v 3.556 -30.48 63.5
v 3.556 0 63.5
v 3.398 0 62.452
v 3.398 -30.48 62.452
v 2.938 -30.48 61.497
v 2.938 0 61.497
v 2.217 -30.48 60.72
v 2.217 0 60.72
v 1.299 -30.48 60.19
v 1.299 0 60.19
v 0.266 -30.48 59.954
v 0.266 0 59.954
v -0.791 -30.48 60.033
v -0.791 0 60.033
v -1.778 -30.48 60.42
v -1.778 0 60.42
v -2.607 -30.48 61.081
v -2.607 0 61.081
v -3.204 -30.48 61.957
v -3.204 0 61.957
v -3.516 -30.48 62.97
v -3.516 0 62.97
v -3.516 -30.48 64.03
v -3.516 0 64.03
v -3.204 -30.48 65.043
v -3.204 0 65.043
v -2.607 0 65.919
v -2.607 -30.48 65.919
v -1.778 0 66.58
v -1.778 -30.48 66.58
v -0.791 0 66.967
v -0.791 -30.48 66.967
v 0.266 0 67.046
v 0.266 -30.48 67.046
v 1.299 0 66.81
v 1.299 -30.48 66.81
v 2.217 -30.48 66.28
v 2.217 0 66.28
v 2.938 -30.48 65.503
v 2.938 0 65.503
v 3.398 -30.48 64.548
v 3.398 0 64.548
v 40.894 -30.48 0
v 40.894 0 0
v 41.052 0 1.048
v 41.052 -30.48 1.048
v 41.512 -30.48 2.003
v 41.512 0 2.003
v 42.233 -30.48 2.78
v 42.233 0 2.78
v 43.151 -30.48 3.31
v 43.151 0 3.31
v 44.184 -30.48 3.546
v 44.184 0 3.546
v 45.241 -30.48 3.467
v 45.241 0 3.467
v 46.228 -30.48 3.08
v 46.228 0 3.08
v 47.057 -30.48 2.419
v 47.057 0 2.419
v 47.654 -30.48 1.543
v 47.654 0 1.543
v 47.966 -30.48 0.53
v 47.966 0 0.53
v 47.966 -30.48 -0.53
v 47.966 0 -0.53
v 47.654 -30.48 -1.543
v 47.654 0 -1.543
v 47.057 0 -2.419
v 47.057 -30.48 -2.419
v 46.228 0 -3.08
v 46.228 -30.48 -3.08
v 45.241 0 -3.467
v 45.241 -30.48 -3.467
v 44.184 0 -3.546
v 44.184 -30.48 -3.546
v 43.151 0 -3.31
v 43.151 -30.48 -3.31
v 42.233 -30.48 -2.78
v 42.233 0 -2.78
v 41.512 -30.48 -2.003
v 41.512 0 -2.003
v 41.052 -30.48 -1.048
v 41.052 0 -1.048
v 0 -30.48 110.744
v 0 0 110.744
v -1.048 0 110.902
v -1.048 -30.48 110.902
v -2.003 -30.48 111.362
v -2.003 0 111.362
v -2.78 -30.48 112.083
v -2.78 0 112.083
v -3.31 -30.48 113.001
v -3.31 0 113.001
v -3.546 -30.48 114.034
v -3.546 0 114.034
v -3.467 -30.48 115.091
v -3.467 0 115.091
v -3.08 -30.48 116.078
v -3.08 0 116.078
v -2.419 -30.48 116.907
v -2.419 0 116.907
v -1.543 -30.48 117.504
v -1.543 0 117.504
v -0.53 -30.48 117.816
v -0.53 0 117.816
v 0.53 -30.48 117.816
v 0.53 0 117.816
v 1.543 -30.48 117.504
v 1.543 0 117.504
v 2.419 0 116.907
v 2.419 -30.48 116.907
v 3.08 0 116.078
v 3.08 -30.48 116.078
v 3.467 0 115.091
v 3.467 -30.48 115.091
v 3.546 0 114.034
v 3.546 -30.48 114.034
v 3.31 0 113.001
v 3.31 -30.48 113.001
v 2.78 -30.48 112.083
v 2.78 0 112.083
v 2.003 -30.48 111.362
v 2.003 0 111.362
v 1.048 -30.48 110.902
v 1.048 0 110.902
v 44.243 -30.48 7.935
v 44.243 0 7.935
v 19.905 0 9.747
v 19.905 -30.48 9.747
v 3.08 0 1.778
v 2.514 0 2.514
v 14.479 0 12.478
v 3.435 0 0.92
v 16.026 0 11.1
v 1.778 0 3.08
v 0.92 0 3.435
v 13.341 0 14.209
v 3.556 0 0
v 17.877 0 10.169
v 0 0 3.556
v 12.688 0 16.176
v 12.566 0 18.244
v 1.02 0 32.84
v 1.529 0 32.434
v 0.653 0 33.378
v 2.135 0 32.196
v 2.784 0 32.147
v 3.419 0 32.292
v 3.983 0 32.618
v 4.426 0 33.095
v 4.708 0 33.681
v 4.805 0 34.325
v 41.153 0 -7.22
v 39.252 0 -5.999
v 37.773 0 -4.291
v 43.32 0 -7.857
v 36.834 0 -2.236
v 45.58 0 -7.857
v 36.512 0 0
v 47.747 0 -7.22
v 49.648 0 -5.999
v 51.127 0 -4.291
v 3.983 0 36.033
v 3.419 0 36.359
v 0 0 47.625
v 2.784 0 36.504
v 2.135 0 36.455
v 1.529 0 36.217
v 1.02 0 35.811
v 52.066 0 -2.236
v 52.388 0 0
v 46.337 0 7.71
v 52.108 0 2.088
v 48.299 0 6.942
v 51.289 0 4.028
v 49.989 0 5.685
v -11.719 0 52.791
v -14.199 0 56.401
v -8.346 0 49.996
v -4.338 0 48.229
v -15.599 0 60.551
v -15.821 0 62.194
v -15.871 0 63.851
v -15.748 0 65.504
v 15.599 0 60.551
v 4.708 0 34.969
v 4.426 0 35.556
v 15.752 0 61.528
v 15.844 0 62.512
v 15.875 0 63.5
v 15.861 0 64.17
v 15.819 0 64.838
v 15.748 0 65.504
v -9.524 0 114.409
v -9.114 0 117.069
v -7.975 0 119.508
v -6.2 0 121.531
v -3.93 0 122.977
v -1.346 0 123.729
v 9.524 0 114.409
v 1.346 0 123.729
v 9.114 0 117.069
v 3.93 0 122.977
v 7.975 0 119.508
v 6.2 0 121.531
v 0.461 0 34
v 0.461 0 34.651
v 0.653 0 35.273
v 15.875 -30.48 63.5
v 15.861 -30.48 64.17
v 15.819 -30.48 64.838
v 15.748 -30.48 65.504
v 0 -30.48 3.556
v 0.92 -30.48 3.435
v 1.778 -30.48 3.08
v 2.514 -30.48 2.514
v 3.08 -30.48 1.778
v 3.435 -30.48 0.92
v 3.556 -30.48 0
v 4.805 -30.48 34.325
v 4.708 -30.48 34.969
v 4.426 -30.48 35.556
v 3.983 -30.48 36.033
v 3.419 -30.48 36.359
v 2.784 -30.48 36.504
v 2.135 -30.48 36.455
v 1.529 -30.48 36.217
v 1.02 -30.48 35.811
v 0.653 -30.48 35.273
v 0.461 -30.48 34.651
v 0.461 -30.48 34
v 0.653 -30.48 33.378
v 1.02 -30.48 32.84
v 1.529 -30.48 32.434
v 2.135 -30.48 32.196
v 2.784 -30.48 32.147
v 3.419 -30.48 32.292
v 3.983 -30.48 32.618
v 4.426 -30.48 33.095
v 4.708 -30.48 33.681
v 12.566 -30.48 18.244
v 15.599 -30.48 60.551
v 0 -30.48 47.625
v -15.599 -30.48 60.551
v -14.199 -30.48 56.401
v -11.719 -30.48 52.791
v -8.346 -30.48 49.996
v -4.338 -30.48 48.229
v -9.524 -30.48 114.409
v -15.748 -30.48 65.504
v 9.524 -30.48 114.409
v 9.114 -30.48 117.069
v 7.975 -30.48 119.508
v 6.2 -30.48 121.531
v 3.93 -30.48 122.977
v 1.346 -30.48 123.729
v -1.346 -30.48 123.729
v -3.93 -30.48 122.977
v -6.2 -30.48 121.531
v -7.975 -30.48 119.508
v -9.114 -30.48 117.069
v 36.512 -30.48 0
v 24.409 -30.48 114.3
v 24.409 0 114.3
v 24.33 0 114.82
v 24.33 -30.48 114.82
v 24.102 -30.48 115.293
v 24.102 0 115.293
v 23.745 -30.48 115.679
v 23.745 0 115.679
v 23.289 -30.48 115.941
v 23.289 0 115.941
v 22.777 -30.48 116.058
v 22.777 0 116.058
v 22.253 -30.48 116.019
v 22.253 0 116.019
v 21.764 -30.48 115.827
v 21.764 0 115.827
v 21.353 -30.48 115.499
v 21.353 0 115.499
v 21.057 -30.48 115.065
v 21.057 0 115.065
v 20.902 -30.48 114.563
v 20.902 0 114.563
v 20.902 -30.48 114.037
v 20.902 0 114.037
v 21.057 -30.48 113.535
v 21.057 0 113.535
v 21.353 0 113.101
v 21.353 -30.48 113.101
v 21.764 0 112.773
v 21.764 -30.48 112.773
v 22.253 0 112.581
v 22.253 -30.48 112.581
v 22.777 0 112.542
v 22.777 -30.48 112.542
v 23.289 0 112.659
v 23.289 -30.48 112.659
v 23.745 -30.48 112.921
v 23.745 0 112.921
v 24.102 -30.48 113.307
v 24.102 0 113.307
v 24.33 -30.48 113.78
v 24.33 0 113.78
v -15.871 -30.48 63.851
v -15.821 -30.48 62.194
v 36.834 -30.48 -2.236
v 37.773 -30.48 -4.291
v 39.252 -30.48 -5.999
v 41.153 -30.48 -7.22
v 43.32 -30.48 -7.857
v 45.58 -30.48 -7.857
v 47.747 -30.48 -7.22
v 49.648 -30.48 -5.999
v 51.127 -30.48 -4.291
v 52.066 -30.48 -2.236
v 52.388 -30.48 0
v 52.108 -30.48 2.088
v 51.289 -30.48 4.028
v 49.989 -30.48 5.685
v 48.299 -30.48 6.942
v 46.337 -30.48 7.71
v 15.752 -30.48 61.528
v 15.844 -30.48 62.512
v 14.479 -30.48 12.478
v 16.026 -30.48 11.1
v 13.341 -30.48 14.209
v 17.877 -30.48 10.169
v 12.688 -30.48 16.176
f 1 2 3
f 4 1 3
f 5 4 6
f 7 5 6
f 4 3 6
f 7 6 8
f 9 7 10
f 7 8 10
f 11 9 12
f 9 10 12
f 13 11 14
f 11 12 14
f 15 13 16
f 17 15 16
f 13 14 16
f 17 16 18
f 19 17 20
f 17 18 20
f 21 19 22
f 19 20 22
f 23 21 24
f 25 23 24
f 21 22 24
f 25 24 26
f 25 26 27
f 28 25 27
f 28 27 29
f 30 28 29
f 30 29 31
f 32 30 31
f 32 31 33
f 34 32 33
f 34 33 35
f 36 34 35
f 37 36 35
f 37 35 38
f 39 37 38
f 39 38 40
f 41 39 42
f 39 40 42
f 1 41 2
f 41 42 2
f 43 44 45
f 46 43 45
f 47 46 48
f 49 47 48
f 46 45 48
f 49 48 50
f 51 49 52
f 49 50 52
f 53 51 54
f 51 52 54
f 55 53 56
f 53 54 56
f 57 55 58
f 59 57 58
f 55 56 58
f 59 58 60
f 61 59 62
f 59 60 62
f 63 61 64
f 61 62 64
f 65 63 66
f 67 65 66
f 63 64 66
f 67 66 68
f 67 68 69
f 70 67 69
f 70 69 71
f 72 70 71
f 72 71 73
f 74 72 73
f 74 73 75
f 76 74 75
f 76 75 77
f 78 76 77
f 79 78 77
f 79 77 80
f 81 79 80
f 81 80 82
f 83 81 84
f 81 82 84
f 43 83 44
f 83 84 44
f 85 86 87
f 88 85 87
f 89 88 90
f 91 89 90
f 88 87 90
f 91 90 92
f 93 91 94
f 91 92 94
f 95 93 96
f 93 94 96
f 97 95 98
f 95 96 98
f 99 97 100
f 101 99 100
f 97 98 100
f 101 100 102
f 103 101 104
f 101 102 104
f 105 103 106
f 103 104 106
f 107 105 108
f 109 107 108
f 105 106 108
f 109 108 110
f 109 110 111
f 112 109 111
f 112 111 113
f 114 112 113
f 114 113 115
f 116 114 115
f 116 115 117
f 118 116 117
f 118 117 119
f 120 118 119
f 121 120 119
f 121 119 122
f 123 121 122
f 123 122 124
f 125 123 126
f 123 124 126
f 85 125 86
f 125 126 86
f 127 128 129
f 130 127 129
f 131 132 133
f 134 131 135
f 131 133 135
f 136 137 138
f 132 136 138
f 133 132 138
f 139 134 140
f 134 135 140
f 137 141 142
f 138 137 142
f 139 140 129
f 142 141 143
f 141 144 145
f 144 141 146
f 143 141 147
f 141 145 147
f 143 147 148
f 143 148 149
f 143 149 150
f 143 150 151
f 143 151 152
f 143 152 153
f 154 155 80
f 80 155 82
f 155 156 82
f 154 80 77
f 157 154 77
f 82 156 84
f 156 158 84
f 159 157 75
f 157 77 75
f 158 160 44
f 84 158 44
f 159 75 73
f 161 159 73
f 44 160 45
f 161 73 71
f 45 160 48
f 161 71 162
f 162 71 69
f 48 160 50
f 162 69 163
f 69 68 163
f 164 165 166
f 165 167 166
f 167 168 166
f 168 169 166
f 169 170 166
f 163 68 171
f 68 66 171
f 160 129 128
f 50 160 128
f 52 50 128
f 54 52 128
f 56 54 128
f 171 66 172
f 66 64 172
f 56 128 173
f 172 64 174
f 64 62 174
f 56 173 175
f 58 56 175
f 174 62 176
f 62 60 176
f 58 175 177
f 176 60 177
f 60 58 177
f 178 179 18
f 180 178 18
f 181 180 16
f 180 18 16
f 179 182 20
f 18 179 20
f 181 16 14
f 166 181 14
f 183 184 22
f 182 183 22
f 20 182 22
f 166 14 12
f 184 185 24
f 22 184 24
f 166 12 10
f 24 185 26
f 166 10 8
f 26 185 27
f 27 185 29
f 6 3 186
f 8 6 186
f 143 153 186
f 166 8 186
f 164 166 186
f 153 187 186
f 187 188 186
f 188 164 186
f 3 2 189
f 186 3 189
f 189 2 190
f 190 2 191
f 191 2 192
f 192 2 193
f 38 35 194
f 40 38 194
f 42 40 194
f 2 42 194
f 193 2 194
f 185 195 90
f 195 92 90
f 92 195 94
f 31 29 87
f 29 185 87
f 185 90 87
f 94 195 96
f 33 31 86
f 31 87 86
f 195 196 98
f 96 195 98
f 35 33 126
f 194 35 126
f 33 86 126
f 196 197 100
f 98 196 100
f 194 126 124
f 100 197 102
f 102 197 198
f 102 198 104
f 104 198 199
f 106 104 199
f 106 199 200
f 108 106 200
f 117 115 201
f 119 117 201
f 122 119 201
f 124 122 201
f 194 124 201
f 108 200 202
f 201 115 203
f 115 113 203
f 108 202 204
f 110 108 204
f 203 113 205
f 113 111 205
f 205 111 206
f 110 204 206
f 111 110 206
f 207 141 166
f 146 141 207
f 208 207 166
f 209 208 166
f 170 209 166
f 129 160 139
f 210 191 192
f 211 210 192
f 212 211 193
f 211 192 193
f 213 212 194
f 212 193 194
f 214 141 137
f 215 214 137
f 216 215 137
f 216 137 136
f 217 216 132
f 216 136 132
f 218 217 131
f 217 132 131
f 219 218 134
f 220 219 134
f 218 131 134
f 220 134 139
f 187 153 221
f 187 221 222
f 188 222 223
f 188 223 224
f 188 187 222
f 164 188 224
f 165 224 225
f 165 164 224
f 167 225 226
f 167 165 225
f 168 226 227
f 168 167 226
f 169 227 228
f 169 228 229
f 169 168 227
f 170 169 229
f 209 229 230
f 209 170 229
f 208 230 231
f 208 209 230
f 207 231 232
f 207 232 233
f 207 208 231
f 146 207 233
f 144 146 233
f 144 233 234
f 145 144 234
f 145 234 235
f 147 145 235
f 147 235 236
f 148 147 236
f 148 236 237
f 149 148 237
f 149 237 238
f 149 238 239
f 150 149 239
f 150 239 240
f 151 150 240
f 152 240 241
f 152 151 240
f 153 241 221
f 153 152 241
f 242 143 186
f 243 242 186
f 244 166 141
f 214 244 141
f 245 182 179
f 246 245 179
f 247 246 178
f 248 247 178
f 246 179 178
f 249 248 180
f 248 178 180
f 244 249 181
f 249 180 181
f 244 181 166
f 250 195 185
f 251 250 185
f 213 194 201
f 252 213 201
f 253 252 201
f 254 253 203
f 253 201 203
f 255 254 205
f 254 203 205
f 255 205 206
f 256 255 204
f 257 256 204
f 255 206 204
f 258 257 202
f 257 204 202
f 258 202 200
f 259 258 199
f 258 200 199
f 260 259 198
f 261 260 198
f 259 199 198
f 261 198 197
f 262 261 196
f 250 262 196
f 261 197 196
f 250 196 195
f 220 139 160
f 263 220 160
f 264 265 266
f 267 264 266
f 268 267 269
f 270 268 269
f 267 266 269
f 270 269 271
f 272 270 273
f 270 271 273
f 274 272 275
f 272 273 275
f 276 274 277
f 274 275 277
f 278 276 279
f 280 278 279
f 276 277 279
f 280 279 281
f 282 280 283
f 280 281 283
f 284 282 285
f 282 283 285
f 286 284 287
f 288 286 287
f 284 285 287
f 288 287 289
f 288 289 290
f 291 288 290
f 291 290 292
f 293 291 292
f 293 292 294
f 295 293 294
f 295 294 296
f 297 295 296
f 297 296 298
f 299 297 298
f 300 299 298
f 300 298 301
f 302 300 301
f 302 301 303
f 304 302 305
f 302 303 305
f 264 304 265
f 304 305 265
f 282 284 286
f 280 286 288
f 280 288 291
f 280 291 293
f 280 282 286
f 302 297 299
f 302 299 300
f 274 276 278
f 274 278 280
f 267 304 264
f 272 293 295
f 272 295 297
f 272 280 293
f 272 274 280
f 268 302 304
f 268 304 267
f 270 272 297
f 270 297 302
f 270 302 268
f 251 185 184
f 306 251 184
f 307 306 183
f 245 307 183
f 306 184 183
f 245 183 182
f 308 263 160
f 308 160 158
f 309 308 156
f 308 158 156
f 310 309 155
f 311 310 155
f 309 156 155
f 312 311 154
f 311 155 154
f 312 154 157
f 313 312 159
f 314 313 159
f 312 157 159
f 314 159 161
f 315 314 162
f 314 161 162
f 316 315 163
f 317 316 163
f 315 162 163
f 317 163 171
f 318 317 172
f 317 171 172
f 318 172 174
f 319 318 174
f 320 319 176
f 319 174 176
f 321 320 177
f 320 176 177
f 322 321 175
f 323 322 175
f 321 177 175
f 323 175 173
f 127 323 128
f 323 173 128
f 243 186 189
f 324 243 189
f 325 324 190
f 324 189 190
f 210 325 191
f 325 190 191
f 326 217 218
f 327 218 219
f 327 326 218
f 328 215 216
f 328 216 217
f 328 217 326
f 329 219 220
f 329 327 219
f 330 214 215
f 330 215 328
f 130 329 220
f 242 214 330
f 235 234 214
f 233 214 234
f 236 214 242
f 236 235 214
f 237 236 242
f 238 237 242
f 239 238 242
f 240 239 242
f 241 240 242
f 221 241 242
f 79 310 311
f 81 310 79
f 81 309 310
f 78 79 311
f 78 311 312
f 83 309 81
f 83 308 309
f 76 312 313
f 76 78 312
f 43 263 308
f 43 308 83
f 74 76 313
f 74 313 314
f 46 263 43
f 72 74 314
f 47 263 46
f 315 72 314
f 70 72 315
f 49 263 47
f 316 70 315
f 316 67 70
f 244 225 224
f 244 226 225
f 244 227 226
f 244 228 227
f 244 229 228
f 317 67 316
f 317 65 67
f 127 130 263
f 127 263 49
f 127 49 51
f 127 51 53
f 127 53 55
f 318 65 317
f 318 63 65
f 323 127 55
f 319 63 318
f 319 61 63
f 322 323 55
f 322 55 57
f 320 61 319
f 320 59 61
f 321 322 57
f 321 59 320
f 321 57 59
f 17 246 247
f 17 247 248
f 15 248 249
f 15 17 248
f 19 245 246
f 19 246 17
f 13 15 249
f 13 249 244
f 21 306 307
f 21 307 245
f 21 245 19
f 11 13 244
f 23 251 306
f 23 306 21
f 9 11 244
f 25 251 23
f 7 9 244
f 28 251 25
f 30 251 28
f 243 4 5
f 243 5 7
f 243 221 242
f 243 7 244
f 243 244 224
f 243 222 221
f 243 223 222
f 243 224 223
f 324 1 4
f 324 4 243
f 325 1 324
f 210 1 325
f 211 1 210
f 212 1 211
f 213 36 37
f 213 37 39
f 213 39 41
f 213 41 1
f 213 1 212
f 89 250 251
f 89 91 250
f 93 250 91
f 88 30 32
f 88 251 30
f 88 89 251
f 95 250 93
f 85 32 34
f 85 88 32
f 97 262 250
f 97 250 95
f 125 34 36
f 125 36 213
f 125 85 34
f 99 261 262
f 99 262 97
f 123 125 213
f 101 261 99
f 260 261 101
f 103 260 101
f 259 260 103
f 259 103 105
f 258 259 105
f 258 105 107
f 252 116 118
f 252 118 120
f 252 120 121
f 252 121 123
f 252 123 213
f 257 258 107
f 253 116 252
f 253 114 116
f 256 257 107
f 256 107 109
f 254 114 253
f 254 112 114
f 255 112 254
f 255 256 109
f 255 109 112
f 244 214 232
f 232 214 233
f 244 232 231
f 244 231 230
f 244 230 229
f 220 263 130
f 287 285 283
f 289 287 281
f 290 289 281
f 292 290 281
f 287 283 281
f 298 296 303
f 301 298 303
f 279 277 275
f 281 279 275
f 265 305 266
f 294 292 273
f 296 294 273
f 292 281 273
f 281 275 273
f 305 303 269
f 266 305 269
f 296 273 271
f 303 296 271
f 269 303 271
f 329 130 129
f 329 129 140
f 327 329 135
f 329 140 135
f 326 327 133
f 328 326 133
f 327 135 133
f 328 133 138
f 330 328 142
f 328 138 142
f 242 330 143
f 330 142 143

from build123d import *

# Parameters (mm, degrees)
F0_R     = 2.1842909743
F1_DEPTH = 30.48
F0_R_2   = 1.7632939696


with BuildPart() as f1:
    # F0 (on Front) → F1 (new body)
    with BuildSketch(Plane.XZ):
        with BuildLine():
            ThreePointArc((-9.5243800429, 114.4086728964), (-6.7735047921, 107.6033398002), (0, 104.775))
            ThreePointArc((0, 104.775), (6.7351920908, 107.5648079092), (9.525, 114.3))
            ThreePointArc((9.525, 114.3), (9.5248450095, 114.3543373324), (9.5243800429, 114.4086728964))
            ThreePointArc((9.5243800429, 114.4086728964), (0, 123.825), (-9.5243800429, 114.4086728964))
        make_face()
        with BuildLine():
            ThreePointArc((3.556, 114.3), (2.5144717139, 111.7855282861), (0, 110.744))
            ThreePointArc((0, 110.744), (-2.5144717139, 116.8144717139), (3.556, 114.3))
        make_face(mode=Mode.SUBTRACT)
        with BuildLine():
            ThreePointArc((9.525, 114.3), (6.7351920908, 107.5648079092), (0, 104.775))
            Line((0, 104.775), (0, 79.375))
            ThreePointArc((0, 79.375), (10.4928697542, 75.4128212159), (15.7479913604, 65.5040940878))
            Line((15.7479913604, 65.5040940878), (9.5243800429, 114.4086728964))
            ThreePointArc((9.5243800429, 114.4086728964), (9.5248450095, 114.3543373324), (9.525, 114.3))
        make_face()
        with BuildLine():
            Line((0, 79.375), (0, 104.775))
            ThreePointArc((0, 104.775), (-6.7735047921, 107.6033398002), (-9.5243800429, 114.4086728964))
            Line((-9.5243800429, 114.4086728964), (-15.7479913604, 65.5040940878))
            ThreePointArc((-15.7479913604, 65.5040940878), (-10.4928697542, 75.4128212159), (0, 79.375))
        make_face()
        with BuildLine():
            ThreePointArc((15.7479913604, 65.5040940878), (10.4928697542, 75.4128212159), (0, 79.375))
            Line((0, 79.375), (0, 67.056))
            ThreePointArc((0, 67.056), (2.5144717139, 66.0144717139), (3.556, 63.5))
            ThreePointArc((3.556, 63.5), (2.5144717139, 60.9855282861), (0, 59.944))
            Line((0, 59.944), (0, 47.625))
            ThreePointArc((0, 47.625), (10.1293130273, 51.2765535713), (15.5987546644, 60.5513599881))
            ThreePointArc((15.5987546644, 60.5513599881), (15.8057877896, 62.0192240712), (15.875, 63.5))
            ThreePointArc((15.875, 63.5), (15.8432160221, 64.5040573076), (15.7479913604, 65.5040940878))
        make_face()
        with BuildLine():
            Line((0, 67.056), (0, 79.375))
            ThreePointArc((0, 79.375), (-10.4928697542, 75.4128212159), (-15.7479913604, 65.5040940878))
            ThreePointArc((-15.7479913604, 65.5040940878), (-15.8677980625, 63.0218685866), (-15.5987546644, 60.5513599881))
            ThreePointArc((-15.5987546644, 60.5513599881), (-10.1293130273, 51.2765535713), (0, 47.625))
            Line((0, 47.625), (0, 59.944))
            ThreePointArc((0, 59.944), (-3.556, 63.5), (0, 67.056))
        make_face()
        with BuildLine():
            ThreePointArc((15.5987546644, 60.5513599881), (10.1293130273, 51.2765535713), (0, 47.625))
            Line((0, 47.625), (0, 11.2290981952))
            ThreePointArc((0, 11.2290981952), (7.9401714804, 7.9401714804), (11.2290981952, 0))
            Line((11.2290981952, 0), (36.5125, 0))
            ThreePointArc((36.5125, 0), (38.764717935, 5.539086034), (44.2432651255, 7.9348073034))
            Line((44.2432651255, 7.9348073034), (19.9053036746, 9.7469774609))
            ThreePointArc((19.9053036746, 9.7469774609), (14.4792388722, 12.4782393627), (12.5657807814, 18.2437097642))
            Line((12.5657807814, 18.2437097642), (15.5987546644, 60.5513599881))
        make_face()
        with Locations((2.6209076754, 34.3253262466)):
            Circle(F0_R, mode=Mode.SUBTRACT)
        with BuildLine():
            ThreePointArc((11.2290981952, 0), (7.9401714804, 7.9401714804), (0, 11.2290981952))
            Line((0, 11.2290981952), (0, 3.556))
            ThreePointArc((0, 3.556), (2.5144717139, 2.5144717139), (3.556, 0))
            Line((3.556, 0), (11.2290981952, 0))
        make_face()
        with BuildLine():
            ThreePointArc((44.2432651255, 7.9348073034), (38.764717935, 5.539086034), (36.5125, 0))
            ThreePointArc((36.5125, 0), (44.45, -7.9375), (52.3875, 0))
            ThreePointArc((52.3875, 0), (49.989086034, 5.685282065), (44.2432651255, 7.9348073034))
        make_face()
        with BuildLine():
            ThreePointArc((48.006, 0), (44.45, -3.556), (40.894, 0))
            ThreePointArc((40.894, 0), (44.45, 3.556), (48.006, 0))
        make_face(mode=Mode.SUBTRACT)
    extrude(amount=F1_DEPTH)


with BuildPart() as f1b:
    # F0 (on Front) → F1, piece 2 (new body)
    with BuildSketch(Plane.XZ):
        with Locations((22.6452313364, 114.3)):
            Circle(F0_R_2)
    extrude(amount=F1_DEPTH)


solid = Compound([f1.part, f1b.part])
